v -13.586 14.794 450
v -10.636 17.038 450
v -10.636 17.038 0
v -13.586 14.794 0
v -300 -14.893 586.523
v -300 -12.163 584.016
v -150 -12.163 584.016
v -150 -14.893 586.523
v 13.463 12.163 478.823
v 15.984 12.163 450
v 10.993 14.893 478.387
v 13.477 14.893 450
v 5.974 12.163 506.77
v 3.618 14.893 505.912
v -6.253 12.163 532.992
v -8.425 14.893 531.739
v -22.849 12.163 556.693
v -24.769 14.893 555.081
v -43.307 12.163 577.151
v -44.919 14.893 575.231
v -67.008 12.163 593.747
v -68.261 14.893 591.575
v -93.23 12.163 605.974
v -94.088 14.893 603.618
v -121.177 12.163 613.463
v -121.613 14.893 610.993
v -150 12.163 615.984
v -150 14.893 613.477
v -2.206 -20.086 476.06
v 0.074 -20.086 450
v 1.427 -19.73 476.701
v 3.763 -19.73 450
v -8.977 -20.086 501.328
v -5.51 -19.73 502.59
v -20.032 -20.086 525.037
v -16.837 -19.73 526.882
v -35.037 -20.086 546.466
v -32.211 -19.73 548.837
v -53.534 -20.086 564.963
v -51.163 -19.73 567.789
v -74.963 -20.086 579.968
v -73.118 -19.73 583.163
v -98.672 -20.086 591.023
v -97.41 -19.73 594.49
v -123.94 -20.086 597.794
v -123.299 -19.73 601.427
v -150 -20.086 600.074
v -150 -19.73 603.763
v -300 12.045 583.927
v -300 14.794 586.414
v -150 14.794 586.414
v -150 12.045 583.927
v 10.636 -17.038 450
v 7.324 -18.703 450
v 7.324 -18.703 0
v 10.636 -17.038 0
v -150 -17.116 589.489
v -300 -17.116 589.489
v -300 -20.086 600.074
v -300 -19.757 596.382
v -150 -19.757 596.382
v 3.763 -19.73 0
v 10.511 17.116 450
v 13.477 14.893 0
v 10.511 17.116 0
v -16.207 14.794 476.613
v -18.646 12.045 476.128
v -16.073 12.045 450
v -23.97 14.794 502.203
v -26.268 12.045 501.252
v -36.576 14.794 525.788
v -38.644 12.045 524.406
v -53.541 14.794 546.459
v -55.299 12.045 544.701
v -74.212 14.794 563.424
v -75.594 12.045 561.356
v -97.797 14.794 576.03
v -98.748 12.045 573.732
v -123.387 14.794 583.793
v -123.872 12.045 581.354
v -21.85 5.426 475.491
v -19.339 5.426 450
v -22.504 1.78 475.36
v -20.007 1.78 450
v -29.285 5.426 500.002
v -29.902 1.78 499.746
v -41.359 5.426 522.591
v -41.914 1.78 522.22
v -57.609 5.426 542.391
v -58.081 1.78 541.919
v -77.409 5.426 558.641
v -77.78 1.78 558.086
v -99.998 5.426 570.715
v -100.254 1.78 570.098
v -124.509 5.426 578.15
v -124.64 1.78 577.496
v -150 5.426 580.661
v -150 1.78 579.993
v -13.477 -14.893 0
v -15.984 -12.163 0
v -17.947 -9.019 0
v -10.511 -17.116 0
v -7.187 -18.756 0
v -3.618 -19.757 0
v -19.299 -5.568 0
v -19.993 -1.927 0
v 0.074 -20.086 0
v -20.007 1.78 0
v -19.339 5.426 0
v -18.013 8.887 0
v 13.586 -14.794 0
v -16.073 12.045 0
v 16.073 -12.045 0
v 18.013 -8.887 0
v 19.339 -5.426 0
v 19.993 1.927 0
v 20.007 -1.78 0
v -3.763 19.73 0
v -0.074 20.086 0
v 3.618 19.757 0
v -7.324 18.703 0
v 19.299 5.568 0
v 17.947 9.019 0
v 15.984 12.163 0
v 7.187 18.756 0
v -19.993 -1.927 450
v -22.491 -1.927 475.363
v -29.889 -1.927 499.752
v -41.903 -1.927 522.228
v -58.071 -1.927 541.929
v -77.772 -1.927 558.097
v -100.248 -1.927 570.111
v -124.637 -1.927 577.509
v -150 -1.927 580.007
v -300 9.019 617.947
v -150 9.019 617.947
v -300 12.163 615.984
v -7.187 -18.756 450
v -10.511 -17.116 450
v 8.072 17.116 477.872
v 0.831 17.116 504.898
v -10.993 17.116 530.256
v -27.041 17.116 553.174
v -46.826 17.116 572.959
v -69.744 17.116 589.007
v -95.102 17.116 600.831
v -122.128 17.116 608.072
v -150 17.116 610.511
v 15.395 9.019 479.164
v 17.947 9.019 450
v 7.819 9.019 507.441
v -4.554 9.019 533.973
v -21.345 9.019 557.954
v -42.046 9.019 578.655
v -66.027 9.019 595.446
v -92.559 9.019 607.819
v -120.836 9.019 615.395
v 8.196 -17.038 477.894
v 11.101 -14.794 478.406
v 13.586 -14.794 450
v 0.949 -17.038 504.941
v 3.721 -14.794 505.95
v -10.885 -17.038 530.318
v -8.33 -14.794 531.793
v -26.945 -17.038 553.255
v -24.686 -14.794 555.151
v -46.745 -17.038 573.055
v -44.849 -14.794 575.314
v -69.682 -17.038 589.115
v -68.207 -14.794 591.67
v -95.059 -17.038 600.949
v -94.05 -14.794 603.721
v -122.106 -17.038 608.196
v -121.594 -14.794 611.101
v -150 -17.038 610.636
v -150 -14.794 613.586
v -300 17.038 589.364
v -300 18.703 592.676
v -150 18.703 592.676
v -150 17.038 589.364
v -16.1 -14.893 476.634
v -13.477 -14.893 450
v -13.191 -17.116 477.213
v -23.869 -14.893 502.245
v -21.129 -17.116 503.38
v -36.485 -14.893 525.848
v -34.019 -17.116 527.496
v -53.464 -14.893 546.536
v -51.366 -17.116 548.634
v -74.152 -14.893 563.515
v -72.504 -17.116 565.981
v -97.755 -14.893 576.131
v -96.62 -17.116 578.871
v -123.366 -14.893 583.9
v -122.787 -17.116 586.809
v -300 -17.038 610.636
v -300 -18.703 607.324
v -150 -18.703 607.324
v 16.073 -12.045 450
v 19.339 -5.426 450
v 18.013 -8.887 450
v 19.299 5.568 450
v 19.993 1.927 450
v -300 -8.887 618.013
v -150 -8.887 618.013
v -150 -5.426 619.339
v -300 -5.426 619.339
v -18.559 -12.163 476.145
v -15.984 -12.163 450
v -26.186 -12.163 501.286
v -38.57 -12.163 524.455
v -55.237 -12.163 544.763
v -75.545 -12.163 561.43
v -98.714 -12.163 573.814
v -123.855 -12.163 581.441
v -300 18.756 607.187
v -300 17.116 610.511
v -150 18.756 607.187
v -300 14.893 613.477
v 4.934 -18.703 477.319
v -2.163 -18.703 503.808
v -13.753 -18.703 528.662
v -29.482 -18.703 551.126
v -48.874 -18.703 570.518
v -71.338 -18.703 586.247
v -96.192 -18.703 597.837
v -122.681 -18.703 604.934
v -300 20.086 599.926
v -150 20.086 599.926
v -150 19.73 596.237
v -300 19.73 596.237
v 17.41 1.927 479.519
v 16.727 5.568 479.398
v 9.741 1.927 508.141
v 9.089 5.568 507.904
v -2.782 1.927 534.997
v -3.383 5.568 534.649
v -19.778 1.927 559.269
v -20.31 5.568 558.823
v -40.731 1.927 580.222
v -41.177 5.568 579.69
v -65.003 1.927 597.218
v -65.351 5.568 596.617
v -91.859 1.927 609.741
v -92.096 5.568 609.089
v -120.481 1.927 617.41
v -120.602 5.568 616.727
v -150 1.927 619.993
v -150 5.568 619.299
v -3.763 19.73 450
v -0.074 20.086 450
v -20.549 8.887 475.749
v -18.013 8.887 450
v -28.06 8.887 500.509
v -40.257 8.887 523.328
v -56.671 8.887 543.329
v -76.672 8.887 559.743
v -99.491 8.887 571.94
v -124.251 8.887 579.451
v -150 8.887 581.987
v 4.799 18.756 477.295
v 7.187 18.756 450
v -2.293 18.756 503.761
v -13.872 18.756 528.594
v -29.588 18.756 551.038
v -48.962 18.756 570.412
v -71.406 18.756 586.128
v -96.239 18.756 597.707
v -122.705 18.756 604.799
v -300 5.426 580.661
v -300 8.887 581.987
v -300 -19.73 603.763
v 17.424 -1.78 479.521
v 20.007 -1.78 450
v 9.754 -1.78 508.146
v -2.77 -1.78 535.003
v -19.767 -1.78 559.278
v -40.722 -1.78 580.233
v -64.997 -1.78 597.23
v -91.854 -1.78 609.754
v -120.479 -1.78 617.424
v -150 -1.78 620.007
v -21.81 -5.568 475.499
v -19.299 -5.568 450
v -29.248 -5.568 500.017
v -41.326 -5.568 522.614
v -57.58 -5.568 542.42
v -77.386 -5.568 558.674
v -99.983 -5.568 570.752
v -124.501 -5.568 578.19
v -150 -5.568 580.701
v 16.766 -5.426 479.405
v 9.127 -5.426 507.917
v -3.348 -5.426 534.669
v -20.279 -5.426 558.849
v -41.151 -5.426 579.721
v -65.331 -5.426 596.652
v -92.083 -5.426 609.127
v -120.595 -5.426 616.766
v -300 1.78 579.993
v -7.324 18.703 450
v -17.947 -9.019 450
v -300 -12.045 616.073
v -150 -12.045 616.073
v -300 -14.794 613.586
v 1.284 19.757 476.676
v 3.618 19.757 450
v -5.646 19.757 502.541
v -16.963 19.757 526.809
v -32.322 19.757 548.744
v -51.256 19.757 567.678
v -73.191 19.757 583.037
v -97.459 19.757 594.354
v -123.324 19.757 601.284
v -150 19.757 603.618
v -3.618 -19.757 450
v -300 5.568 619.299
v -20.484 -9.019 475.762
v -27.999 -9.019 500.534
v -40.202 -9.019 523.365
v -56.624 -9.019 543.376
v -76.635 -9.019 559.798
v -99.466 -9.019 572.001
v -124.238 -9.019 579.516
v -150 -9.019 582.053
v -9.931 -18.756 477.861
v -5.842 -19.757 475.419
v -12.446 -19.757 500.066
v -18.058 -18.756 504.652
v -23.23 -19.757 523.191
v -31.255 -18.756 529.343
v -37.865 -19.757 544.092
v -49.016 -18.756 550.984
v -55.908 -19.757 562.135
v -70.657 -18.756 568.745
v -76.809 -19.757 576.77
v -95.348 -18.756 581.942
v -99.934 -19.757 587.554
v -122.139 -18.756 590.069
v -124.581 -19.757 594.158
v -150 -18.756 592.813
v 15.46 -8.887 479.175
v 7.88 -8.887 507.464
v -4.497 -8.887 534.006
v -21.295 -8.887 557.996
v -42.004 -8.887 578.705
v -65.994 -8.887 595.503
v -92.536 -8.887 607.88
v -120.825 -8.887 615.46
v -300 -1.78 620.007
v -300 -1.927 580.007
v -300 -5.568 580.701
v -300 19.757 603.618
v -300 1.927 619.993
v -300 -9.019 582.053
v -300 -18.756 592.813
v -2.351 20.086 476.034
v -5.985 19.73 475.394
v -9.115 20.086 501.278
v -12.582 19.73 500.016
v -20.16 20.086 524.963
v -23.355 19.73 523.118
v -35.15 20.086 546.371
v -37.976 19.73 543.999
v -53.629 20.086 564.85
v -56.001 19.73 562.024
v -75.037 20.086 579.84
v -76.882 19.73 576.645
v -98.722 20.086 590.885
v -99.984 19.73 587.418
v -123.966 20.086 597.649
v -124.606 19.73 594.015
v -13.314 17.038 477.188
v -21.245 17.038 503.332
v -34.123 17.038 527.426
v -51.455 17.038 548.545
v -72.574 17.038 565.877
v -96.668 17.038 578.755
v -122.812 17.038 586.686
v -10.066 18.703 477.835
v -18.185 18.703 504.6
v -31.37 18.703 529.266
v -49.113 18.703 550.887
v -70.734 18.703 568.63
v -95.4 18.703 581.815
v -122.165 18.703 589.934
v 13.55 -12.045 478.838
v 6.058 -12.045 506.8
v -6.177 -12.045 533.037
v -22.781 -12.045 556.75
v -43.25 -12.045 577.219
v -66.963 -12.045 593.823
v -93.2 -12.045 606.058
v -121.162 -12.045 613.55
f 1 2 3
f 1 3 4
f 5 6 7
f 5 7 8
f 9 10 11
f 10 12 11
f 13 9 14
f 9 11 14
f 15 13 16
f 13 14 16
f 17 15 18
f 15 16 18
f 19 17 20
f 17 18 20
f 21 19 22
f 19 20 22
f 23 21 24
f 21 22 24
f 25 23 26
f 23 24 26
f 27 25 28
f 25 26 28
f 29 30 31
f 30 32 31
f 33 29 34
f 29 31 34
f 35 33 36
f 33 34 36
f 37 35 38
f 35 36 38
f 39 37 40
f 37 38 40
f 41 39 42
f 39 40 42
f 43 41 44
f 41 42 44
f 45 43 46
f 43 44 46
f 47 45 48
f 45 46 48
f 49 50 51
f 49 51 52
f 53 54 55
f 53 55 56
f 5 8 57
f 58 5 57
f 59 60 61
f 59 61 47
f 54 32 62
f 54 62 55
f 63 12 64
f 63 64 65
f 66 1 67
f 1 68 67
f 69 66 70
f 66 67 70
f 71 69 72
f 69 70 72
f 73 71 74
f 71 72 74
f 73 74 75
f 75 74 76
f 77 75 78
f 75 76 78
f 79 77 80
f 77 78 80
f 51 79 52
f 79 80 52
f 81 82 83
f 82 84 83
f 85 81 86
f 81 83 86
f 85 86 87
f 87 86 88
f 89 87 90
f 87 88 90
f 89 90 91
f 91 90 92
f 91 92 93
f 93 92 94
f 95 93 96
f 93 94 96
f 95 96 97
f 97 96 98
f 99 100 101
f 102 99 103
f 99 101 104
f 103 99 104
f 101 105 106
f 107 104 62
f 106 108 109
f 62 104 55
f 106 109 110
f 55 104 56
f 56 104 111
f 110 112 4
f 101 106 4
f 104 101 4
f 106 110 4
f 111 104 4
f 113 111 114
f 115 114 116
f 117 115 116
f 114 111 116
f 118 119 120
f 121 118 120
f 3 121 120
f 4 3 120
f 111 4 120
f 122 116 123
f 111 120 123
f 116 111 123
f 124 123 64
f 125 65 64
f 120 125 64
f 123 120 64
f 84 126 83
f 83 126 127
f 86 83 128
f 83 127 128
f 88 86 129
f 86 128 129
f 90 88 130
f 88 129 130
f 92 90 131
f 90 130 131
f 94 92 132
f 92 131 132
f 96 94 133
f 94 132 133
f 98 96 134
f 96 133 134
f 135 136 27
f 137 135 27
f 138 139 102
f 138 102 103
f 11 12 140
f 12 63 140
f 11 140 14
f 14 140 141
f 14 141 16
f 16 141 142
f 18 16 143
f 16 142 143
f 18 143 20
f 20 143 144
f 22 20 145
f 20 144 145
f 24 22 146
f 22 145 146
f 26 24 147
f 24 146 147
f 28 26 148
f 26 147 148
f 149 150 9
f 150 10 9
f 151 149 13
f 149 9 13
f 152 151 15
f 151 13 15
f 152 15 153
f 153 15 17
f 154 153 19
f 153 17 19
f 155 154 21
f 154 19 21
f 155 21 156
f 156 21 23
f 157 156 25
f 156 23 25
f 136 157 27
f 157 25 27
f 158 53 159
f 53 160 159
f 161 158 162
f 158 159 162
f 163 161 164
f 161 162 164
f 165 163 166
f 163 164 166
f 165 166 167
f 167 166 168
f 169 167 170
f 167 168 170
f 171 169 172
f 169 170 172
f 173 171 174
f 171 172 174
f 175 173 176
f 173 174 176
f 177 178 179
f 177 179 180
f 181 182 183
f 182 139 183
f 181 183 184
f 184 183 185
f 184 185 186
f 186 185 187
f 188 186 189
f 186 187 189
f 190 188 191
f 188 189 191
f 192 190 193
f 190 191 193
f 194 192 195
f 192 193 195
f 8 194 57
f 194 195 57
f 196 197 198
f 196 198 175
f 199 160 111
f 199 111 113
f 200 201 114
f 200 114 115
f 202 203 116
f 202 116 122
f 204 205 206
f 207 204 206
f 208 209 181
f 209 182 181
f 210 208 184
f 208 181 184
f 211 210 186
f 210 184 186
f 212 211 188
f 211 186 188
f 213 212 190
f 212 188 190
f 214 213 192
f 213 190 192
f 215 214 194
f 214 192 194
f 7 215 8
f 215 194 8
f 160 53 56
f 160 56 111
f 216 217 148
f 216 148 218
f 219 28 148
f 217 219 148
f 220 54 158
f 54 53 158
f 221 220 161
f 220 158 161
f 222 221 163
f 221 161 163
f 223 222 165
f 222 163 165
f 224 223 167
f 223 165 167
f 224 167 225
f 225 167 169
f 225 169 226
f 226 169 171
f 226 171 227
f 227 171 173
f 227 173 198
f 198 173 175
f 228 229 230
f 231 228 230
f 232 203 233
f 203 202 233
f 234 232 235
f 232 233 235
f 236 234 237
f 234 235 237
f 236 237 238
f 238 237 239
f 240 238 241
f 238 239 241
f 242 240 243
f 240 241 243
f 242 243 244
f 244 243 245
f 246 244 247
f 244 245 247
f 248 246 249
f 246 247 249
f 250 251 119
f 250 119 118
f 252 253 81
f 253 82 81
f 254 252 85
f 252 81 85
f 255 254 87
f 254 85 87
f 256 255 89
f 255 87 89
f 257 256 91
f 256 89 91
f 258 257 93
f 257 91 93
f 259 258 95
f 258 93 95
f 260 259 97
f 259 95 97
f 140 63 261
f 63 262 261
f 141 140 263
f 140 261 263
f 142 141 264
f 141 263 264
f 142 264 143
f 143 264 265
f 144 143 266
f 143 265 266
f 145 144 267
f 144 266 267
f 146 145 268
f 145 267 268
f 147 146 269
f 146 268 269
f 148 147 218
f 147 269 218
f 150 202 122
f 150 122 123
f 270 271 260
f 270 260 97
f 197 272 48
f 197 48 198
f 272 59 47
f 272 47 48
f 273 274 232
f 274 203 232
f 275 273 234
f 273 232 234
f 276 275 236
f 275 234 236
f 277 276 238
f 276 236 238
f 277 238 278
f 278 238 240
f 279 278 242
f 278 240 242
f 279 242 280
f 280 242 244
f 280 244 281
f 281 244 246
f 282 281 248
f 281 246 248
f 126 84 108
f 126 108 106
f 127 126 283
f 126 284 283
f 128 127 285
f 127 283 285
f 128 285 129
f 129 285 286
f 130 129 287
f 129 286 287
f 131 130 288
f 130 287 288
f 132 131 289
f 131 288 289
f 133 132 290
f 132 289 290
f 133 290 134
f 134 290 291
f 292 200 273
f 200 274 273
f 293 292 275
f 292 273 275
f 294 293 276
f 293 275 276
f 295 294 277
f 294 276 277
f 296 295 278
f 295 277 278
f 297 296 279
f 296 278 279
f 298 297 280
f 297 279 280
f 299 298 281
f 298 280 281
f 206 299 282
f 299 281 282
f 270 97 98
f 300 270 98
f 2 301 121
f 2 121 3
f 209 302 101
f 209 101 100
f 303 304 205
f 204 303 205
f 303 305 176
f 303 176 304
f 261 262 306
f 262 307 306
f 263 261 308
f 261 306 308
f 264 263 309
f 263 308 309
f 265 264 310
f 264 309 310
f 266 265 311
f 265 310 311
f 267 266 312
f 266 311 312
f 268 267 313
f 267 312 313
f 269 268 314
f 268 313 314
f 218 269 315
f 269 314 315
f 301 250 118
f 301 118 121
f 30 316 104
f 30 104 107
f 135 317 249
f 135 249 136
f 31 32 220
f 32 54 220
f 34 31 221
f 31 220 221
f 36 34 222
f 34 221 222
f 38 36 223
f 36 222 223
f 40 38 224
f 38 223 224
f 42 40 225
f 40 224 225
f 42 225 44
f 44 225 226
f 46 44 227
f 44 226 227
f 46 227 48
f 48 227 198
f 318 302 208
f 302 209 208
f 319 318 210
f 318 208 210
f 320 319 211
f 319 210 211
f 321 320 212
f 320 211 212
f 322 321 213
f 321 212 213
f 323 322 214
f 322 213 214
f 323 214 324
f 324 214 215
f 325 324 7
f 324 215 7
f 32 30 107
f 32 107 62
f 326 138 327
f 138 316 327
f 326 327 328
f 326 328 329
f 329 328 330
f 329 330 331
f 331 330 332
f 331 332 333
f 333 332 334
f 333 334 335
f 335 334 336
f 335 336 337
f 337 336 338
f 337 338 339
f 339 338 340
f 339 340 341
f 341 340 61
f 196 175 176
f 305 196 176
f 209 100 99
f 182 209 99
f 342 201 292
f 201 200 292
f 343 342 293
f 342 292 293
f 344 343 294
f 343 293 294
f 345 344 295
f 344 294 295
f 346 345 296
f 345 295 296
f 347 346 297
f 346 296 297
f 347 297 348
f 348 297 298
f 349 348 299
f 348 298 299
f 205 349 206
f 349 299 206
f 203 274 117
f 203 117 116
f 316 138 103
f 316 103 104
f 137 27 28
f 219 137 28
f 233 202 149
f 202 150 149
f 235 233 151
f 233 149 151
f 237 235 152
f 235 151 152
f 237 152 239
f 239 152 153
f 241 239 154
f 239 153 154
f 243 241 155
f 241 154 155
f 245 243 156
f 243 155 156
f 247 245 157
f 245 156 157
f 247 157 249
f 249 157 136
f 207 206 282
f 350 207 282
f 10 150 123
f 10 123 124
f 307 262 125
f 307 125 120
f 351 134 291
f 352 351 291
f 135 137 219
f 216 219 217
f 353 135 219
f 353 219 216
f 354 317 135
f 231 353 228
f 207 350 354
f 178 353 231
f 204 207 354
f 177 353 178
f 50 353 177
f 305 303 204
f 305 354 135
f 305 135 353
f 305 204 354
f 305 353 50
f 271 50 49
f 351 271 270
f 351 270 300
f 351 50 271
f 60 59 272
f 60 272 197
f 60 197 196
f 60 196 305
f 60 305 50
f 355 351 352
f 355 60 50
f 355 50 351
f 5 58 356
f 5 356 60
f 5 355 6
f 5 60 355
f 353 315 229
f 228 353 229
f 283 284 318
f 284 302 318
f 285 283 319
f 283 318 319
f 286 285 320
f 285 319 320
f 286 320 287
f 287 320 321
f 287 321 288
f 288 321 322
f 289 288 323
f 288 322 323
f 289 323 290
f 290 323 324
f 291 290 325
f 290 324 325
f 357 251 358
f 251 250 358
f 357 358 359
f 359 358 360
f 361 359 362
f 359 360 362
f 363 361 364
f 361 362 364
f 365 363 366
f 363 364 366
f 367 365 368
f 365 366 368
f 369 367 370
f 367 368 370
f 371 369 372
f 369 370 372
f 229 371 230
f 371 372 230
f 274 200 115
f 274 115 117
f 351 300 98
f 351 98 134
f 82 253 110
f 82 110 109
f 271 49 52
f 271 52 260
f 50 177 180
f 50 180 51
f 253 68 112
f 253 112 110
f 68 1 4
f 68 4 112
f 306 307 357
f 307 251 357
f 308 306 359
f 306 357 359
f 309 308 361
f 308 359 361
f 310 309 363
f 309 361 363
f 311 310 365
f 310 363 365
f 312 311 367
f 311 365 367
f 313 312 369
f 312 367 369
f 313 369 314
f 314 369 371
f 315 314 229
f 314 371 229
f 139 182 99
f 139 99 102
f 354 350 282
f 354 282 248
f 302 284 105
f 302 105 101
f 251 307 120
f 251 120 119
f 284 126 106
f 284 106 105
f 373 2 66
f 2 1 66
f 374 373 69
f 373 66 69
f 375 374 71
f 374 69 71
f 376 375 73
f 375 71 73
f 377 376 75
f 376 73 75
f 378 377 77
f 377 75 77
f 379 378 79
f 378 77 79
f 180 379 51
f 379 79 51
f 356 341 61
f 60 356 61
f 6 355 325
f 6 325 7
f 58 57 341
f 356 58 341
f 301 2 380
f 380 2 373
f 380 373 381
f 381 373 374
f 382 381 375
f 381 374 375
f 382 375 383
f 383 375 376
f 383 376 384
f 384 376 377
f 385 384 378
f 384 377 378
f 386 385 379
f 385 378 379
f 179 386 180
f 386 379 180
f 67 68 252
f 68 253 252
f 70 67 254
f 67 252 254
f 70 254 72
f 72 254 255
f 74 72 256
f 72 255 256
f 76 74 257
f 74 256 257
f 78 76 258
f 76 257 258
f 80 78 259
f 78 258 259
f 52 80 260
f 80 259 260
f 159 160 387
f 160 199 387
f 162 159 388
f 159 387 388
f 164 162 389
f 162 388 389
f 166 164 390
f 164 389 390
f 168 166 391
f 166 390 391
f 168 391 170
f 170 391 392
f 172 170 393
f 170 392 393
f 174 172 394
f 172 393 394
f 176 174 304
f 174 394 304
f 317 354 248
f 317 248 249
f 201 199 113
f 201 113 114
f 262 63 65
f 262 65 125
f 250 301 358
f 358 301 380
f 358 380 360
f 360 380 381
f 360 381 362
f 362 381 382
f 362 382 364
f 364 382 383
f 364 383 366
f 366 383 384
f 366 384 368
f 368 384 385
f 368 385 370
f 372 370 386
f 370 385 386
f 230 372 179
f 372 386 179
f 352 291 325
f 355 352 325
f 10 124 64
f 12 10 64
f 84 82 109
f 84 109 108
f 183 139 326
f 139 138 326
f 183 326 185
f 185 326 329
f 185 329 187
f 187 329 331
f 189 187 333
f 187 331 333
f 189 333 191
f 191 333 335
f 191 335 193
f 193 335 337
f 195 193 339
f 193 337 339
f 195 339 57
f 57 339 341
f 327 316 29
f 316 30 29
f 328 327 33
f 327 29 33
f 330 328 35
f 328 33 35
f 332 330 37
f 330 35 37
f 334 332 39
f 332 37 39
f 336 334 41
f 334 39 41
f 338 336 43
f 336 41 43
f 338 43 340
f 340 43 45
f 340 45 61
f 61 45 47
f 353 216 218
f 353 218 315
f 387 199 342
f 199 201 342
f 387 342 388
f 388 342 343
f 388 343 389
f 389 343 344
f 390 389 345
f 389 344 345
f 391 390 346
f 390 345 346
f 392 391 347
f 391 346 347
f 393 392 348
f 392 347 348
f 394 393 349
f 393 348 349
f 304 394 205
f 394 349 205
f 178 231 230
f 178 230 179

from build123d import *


with BuildPart() as f2:
    # F2: sweep along a path in F1
    with BuildLine(Plane.XZ) as f2_path:
        Line((0, 0), (0, 450))
        ThreePointArc((0, 450), (-43.933983, 556.066017), (-150, 600))
        Line((-150, 600), (-300, 600))
    # F0 (on Top) → F2 (sweep)
    with BuildSketch(Plane.XY):
        Polygon((-19.993064, -1.926657), (-19.298622, -5.567568), (-17.946988, -9.018882), (-15.984192, -12.163069), (-13.477072, -14.893057), (-10.511008, -17.11588), (-7.187003, -18.755842), (-3.618254, -19.757096), (0.073711, -20.085547), (3.763165, -19.730008), (7.32447, -18.702587), (10.636348, -17.038272), (13.586018, -14.793739), (16.073033, -12.045424), (18.0127, -8.886915), (19.338966, -5.425774), (20.006667, -1.779864), (19.993064, 1.926657), (19.298622, 5.567568), (17.946988, 9.018882), (15.984192, 12.163069), (13.477072, 14.893057), (10.511008, 17.11588), (7.187003, 18.755842), (3.618254, 19.757096), (-0.073711, 20.085547), (-3.763165, 19.730008), (-7.32447, 18.702587), (-10.636348, 17.038272), (-13.586018, 14.793739), (-16.073033, 12.045424), (-18.0127, 8.886915), (-19.338966, 5.425774), (-20.006667, 1.779864), align=None)
    sweep(path=f2_path.line)


solid = f2.part
